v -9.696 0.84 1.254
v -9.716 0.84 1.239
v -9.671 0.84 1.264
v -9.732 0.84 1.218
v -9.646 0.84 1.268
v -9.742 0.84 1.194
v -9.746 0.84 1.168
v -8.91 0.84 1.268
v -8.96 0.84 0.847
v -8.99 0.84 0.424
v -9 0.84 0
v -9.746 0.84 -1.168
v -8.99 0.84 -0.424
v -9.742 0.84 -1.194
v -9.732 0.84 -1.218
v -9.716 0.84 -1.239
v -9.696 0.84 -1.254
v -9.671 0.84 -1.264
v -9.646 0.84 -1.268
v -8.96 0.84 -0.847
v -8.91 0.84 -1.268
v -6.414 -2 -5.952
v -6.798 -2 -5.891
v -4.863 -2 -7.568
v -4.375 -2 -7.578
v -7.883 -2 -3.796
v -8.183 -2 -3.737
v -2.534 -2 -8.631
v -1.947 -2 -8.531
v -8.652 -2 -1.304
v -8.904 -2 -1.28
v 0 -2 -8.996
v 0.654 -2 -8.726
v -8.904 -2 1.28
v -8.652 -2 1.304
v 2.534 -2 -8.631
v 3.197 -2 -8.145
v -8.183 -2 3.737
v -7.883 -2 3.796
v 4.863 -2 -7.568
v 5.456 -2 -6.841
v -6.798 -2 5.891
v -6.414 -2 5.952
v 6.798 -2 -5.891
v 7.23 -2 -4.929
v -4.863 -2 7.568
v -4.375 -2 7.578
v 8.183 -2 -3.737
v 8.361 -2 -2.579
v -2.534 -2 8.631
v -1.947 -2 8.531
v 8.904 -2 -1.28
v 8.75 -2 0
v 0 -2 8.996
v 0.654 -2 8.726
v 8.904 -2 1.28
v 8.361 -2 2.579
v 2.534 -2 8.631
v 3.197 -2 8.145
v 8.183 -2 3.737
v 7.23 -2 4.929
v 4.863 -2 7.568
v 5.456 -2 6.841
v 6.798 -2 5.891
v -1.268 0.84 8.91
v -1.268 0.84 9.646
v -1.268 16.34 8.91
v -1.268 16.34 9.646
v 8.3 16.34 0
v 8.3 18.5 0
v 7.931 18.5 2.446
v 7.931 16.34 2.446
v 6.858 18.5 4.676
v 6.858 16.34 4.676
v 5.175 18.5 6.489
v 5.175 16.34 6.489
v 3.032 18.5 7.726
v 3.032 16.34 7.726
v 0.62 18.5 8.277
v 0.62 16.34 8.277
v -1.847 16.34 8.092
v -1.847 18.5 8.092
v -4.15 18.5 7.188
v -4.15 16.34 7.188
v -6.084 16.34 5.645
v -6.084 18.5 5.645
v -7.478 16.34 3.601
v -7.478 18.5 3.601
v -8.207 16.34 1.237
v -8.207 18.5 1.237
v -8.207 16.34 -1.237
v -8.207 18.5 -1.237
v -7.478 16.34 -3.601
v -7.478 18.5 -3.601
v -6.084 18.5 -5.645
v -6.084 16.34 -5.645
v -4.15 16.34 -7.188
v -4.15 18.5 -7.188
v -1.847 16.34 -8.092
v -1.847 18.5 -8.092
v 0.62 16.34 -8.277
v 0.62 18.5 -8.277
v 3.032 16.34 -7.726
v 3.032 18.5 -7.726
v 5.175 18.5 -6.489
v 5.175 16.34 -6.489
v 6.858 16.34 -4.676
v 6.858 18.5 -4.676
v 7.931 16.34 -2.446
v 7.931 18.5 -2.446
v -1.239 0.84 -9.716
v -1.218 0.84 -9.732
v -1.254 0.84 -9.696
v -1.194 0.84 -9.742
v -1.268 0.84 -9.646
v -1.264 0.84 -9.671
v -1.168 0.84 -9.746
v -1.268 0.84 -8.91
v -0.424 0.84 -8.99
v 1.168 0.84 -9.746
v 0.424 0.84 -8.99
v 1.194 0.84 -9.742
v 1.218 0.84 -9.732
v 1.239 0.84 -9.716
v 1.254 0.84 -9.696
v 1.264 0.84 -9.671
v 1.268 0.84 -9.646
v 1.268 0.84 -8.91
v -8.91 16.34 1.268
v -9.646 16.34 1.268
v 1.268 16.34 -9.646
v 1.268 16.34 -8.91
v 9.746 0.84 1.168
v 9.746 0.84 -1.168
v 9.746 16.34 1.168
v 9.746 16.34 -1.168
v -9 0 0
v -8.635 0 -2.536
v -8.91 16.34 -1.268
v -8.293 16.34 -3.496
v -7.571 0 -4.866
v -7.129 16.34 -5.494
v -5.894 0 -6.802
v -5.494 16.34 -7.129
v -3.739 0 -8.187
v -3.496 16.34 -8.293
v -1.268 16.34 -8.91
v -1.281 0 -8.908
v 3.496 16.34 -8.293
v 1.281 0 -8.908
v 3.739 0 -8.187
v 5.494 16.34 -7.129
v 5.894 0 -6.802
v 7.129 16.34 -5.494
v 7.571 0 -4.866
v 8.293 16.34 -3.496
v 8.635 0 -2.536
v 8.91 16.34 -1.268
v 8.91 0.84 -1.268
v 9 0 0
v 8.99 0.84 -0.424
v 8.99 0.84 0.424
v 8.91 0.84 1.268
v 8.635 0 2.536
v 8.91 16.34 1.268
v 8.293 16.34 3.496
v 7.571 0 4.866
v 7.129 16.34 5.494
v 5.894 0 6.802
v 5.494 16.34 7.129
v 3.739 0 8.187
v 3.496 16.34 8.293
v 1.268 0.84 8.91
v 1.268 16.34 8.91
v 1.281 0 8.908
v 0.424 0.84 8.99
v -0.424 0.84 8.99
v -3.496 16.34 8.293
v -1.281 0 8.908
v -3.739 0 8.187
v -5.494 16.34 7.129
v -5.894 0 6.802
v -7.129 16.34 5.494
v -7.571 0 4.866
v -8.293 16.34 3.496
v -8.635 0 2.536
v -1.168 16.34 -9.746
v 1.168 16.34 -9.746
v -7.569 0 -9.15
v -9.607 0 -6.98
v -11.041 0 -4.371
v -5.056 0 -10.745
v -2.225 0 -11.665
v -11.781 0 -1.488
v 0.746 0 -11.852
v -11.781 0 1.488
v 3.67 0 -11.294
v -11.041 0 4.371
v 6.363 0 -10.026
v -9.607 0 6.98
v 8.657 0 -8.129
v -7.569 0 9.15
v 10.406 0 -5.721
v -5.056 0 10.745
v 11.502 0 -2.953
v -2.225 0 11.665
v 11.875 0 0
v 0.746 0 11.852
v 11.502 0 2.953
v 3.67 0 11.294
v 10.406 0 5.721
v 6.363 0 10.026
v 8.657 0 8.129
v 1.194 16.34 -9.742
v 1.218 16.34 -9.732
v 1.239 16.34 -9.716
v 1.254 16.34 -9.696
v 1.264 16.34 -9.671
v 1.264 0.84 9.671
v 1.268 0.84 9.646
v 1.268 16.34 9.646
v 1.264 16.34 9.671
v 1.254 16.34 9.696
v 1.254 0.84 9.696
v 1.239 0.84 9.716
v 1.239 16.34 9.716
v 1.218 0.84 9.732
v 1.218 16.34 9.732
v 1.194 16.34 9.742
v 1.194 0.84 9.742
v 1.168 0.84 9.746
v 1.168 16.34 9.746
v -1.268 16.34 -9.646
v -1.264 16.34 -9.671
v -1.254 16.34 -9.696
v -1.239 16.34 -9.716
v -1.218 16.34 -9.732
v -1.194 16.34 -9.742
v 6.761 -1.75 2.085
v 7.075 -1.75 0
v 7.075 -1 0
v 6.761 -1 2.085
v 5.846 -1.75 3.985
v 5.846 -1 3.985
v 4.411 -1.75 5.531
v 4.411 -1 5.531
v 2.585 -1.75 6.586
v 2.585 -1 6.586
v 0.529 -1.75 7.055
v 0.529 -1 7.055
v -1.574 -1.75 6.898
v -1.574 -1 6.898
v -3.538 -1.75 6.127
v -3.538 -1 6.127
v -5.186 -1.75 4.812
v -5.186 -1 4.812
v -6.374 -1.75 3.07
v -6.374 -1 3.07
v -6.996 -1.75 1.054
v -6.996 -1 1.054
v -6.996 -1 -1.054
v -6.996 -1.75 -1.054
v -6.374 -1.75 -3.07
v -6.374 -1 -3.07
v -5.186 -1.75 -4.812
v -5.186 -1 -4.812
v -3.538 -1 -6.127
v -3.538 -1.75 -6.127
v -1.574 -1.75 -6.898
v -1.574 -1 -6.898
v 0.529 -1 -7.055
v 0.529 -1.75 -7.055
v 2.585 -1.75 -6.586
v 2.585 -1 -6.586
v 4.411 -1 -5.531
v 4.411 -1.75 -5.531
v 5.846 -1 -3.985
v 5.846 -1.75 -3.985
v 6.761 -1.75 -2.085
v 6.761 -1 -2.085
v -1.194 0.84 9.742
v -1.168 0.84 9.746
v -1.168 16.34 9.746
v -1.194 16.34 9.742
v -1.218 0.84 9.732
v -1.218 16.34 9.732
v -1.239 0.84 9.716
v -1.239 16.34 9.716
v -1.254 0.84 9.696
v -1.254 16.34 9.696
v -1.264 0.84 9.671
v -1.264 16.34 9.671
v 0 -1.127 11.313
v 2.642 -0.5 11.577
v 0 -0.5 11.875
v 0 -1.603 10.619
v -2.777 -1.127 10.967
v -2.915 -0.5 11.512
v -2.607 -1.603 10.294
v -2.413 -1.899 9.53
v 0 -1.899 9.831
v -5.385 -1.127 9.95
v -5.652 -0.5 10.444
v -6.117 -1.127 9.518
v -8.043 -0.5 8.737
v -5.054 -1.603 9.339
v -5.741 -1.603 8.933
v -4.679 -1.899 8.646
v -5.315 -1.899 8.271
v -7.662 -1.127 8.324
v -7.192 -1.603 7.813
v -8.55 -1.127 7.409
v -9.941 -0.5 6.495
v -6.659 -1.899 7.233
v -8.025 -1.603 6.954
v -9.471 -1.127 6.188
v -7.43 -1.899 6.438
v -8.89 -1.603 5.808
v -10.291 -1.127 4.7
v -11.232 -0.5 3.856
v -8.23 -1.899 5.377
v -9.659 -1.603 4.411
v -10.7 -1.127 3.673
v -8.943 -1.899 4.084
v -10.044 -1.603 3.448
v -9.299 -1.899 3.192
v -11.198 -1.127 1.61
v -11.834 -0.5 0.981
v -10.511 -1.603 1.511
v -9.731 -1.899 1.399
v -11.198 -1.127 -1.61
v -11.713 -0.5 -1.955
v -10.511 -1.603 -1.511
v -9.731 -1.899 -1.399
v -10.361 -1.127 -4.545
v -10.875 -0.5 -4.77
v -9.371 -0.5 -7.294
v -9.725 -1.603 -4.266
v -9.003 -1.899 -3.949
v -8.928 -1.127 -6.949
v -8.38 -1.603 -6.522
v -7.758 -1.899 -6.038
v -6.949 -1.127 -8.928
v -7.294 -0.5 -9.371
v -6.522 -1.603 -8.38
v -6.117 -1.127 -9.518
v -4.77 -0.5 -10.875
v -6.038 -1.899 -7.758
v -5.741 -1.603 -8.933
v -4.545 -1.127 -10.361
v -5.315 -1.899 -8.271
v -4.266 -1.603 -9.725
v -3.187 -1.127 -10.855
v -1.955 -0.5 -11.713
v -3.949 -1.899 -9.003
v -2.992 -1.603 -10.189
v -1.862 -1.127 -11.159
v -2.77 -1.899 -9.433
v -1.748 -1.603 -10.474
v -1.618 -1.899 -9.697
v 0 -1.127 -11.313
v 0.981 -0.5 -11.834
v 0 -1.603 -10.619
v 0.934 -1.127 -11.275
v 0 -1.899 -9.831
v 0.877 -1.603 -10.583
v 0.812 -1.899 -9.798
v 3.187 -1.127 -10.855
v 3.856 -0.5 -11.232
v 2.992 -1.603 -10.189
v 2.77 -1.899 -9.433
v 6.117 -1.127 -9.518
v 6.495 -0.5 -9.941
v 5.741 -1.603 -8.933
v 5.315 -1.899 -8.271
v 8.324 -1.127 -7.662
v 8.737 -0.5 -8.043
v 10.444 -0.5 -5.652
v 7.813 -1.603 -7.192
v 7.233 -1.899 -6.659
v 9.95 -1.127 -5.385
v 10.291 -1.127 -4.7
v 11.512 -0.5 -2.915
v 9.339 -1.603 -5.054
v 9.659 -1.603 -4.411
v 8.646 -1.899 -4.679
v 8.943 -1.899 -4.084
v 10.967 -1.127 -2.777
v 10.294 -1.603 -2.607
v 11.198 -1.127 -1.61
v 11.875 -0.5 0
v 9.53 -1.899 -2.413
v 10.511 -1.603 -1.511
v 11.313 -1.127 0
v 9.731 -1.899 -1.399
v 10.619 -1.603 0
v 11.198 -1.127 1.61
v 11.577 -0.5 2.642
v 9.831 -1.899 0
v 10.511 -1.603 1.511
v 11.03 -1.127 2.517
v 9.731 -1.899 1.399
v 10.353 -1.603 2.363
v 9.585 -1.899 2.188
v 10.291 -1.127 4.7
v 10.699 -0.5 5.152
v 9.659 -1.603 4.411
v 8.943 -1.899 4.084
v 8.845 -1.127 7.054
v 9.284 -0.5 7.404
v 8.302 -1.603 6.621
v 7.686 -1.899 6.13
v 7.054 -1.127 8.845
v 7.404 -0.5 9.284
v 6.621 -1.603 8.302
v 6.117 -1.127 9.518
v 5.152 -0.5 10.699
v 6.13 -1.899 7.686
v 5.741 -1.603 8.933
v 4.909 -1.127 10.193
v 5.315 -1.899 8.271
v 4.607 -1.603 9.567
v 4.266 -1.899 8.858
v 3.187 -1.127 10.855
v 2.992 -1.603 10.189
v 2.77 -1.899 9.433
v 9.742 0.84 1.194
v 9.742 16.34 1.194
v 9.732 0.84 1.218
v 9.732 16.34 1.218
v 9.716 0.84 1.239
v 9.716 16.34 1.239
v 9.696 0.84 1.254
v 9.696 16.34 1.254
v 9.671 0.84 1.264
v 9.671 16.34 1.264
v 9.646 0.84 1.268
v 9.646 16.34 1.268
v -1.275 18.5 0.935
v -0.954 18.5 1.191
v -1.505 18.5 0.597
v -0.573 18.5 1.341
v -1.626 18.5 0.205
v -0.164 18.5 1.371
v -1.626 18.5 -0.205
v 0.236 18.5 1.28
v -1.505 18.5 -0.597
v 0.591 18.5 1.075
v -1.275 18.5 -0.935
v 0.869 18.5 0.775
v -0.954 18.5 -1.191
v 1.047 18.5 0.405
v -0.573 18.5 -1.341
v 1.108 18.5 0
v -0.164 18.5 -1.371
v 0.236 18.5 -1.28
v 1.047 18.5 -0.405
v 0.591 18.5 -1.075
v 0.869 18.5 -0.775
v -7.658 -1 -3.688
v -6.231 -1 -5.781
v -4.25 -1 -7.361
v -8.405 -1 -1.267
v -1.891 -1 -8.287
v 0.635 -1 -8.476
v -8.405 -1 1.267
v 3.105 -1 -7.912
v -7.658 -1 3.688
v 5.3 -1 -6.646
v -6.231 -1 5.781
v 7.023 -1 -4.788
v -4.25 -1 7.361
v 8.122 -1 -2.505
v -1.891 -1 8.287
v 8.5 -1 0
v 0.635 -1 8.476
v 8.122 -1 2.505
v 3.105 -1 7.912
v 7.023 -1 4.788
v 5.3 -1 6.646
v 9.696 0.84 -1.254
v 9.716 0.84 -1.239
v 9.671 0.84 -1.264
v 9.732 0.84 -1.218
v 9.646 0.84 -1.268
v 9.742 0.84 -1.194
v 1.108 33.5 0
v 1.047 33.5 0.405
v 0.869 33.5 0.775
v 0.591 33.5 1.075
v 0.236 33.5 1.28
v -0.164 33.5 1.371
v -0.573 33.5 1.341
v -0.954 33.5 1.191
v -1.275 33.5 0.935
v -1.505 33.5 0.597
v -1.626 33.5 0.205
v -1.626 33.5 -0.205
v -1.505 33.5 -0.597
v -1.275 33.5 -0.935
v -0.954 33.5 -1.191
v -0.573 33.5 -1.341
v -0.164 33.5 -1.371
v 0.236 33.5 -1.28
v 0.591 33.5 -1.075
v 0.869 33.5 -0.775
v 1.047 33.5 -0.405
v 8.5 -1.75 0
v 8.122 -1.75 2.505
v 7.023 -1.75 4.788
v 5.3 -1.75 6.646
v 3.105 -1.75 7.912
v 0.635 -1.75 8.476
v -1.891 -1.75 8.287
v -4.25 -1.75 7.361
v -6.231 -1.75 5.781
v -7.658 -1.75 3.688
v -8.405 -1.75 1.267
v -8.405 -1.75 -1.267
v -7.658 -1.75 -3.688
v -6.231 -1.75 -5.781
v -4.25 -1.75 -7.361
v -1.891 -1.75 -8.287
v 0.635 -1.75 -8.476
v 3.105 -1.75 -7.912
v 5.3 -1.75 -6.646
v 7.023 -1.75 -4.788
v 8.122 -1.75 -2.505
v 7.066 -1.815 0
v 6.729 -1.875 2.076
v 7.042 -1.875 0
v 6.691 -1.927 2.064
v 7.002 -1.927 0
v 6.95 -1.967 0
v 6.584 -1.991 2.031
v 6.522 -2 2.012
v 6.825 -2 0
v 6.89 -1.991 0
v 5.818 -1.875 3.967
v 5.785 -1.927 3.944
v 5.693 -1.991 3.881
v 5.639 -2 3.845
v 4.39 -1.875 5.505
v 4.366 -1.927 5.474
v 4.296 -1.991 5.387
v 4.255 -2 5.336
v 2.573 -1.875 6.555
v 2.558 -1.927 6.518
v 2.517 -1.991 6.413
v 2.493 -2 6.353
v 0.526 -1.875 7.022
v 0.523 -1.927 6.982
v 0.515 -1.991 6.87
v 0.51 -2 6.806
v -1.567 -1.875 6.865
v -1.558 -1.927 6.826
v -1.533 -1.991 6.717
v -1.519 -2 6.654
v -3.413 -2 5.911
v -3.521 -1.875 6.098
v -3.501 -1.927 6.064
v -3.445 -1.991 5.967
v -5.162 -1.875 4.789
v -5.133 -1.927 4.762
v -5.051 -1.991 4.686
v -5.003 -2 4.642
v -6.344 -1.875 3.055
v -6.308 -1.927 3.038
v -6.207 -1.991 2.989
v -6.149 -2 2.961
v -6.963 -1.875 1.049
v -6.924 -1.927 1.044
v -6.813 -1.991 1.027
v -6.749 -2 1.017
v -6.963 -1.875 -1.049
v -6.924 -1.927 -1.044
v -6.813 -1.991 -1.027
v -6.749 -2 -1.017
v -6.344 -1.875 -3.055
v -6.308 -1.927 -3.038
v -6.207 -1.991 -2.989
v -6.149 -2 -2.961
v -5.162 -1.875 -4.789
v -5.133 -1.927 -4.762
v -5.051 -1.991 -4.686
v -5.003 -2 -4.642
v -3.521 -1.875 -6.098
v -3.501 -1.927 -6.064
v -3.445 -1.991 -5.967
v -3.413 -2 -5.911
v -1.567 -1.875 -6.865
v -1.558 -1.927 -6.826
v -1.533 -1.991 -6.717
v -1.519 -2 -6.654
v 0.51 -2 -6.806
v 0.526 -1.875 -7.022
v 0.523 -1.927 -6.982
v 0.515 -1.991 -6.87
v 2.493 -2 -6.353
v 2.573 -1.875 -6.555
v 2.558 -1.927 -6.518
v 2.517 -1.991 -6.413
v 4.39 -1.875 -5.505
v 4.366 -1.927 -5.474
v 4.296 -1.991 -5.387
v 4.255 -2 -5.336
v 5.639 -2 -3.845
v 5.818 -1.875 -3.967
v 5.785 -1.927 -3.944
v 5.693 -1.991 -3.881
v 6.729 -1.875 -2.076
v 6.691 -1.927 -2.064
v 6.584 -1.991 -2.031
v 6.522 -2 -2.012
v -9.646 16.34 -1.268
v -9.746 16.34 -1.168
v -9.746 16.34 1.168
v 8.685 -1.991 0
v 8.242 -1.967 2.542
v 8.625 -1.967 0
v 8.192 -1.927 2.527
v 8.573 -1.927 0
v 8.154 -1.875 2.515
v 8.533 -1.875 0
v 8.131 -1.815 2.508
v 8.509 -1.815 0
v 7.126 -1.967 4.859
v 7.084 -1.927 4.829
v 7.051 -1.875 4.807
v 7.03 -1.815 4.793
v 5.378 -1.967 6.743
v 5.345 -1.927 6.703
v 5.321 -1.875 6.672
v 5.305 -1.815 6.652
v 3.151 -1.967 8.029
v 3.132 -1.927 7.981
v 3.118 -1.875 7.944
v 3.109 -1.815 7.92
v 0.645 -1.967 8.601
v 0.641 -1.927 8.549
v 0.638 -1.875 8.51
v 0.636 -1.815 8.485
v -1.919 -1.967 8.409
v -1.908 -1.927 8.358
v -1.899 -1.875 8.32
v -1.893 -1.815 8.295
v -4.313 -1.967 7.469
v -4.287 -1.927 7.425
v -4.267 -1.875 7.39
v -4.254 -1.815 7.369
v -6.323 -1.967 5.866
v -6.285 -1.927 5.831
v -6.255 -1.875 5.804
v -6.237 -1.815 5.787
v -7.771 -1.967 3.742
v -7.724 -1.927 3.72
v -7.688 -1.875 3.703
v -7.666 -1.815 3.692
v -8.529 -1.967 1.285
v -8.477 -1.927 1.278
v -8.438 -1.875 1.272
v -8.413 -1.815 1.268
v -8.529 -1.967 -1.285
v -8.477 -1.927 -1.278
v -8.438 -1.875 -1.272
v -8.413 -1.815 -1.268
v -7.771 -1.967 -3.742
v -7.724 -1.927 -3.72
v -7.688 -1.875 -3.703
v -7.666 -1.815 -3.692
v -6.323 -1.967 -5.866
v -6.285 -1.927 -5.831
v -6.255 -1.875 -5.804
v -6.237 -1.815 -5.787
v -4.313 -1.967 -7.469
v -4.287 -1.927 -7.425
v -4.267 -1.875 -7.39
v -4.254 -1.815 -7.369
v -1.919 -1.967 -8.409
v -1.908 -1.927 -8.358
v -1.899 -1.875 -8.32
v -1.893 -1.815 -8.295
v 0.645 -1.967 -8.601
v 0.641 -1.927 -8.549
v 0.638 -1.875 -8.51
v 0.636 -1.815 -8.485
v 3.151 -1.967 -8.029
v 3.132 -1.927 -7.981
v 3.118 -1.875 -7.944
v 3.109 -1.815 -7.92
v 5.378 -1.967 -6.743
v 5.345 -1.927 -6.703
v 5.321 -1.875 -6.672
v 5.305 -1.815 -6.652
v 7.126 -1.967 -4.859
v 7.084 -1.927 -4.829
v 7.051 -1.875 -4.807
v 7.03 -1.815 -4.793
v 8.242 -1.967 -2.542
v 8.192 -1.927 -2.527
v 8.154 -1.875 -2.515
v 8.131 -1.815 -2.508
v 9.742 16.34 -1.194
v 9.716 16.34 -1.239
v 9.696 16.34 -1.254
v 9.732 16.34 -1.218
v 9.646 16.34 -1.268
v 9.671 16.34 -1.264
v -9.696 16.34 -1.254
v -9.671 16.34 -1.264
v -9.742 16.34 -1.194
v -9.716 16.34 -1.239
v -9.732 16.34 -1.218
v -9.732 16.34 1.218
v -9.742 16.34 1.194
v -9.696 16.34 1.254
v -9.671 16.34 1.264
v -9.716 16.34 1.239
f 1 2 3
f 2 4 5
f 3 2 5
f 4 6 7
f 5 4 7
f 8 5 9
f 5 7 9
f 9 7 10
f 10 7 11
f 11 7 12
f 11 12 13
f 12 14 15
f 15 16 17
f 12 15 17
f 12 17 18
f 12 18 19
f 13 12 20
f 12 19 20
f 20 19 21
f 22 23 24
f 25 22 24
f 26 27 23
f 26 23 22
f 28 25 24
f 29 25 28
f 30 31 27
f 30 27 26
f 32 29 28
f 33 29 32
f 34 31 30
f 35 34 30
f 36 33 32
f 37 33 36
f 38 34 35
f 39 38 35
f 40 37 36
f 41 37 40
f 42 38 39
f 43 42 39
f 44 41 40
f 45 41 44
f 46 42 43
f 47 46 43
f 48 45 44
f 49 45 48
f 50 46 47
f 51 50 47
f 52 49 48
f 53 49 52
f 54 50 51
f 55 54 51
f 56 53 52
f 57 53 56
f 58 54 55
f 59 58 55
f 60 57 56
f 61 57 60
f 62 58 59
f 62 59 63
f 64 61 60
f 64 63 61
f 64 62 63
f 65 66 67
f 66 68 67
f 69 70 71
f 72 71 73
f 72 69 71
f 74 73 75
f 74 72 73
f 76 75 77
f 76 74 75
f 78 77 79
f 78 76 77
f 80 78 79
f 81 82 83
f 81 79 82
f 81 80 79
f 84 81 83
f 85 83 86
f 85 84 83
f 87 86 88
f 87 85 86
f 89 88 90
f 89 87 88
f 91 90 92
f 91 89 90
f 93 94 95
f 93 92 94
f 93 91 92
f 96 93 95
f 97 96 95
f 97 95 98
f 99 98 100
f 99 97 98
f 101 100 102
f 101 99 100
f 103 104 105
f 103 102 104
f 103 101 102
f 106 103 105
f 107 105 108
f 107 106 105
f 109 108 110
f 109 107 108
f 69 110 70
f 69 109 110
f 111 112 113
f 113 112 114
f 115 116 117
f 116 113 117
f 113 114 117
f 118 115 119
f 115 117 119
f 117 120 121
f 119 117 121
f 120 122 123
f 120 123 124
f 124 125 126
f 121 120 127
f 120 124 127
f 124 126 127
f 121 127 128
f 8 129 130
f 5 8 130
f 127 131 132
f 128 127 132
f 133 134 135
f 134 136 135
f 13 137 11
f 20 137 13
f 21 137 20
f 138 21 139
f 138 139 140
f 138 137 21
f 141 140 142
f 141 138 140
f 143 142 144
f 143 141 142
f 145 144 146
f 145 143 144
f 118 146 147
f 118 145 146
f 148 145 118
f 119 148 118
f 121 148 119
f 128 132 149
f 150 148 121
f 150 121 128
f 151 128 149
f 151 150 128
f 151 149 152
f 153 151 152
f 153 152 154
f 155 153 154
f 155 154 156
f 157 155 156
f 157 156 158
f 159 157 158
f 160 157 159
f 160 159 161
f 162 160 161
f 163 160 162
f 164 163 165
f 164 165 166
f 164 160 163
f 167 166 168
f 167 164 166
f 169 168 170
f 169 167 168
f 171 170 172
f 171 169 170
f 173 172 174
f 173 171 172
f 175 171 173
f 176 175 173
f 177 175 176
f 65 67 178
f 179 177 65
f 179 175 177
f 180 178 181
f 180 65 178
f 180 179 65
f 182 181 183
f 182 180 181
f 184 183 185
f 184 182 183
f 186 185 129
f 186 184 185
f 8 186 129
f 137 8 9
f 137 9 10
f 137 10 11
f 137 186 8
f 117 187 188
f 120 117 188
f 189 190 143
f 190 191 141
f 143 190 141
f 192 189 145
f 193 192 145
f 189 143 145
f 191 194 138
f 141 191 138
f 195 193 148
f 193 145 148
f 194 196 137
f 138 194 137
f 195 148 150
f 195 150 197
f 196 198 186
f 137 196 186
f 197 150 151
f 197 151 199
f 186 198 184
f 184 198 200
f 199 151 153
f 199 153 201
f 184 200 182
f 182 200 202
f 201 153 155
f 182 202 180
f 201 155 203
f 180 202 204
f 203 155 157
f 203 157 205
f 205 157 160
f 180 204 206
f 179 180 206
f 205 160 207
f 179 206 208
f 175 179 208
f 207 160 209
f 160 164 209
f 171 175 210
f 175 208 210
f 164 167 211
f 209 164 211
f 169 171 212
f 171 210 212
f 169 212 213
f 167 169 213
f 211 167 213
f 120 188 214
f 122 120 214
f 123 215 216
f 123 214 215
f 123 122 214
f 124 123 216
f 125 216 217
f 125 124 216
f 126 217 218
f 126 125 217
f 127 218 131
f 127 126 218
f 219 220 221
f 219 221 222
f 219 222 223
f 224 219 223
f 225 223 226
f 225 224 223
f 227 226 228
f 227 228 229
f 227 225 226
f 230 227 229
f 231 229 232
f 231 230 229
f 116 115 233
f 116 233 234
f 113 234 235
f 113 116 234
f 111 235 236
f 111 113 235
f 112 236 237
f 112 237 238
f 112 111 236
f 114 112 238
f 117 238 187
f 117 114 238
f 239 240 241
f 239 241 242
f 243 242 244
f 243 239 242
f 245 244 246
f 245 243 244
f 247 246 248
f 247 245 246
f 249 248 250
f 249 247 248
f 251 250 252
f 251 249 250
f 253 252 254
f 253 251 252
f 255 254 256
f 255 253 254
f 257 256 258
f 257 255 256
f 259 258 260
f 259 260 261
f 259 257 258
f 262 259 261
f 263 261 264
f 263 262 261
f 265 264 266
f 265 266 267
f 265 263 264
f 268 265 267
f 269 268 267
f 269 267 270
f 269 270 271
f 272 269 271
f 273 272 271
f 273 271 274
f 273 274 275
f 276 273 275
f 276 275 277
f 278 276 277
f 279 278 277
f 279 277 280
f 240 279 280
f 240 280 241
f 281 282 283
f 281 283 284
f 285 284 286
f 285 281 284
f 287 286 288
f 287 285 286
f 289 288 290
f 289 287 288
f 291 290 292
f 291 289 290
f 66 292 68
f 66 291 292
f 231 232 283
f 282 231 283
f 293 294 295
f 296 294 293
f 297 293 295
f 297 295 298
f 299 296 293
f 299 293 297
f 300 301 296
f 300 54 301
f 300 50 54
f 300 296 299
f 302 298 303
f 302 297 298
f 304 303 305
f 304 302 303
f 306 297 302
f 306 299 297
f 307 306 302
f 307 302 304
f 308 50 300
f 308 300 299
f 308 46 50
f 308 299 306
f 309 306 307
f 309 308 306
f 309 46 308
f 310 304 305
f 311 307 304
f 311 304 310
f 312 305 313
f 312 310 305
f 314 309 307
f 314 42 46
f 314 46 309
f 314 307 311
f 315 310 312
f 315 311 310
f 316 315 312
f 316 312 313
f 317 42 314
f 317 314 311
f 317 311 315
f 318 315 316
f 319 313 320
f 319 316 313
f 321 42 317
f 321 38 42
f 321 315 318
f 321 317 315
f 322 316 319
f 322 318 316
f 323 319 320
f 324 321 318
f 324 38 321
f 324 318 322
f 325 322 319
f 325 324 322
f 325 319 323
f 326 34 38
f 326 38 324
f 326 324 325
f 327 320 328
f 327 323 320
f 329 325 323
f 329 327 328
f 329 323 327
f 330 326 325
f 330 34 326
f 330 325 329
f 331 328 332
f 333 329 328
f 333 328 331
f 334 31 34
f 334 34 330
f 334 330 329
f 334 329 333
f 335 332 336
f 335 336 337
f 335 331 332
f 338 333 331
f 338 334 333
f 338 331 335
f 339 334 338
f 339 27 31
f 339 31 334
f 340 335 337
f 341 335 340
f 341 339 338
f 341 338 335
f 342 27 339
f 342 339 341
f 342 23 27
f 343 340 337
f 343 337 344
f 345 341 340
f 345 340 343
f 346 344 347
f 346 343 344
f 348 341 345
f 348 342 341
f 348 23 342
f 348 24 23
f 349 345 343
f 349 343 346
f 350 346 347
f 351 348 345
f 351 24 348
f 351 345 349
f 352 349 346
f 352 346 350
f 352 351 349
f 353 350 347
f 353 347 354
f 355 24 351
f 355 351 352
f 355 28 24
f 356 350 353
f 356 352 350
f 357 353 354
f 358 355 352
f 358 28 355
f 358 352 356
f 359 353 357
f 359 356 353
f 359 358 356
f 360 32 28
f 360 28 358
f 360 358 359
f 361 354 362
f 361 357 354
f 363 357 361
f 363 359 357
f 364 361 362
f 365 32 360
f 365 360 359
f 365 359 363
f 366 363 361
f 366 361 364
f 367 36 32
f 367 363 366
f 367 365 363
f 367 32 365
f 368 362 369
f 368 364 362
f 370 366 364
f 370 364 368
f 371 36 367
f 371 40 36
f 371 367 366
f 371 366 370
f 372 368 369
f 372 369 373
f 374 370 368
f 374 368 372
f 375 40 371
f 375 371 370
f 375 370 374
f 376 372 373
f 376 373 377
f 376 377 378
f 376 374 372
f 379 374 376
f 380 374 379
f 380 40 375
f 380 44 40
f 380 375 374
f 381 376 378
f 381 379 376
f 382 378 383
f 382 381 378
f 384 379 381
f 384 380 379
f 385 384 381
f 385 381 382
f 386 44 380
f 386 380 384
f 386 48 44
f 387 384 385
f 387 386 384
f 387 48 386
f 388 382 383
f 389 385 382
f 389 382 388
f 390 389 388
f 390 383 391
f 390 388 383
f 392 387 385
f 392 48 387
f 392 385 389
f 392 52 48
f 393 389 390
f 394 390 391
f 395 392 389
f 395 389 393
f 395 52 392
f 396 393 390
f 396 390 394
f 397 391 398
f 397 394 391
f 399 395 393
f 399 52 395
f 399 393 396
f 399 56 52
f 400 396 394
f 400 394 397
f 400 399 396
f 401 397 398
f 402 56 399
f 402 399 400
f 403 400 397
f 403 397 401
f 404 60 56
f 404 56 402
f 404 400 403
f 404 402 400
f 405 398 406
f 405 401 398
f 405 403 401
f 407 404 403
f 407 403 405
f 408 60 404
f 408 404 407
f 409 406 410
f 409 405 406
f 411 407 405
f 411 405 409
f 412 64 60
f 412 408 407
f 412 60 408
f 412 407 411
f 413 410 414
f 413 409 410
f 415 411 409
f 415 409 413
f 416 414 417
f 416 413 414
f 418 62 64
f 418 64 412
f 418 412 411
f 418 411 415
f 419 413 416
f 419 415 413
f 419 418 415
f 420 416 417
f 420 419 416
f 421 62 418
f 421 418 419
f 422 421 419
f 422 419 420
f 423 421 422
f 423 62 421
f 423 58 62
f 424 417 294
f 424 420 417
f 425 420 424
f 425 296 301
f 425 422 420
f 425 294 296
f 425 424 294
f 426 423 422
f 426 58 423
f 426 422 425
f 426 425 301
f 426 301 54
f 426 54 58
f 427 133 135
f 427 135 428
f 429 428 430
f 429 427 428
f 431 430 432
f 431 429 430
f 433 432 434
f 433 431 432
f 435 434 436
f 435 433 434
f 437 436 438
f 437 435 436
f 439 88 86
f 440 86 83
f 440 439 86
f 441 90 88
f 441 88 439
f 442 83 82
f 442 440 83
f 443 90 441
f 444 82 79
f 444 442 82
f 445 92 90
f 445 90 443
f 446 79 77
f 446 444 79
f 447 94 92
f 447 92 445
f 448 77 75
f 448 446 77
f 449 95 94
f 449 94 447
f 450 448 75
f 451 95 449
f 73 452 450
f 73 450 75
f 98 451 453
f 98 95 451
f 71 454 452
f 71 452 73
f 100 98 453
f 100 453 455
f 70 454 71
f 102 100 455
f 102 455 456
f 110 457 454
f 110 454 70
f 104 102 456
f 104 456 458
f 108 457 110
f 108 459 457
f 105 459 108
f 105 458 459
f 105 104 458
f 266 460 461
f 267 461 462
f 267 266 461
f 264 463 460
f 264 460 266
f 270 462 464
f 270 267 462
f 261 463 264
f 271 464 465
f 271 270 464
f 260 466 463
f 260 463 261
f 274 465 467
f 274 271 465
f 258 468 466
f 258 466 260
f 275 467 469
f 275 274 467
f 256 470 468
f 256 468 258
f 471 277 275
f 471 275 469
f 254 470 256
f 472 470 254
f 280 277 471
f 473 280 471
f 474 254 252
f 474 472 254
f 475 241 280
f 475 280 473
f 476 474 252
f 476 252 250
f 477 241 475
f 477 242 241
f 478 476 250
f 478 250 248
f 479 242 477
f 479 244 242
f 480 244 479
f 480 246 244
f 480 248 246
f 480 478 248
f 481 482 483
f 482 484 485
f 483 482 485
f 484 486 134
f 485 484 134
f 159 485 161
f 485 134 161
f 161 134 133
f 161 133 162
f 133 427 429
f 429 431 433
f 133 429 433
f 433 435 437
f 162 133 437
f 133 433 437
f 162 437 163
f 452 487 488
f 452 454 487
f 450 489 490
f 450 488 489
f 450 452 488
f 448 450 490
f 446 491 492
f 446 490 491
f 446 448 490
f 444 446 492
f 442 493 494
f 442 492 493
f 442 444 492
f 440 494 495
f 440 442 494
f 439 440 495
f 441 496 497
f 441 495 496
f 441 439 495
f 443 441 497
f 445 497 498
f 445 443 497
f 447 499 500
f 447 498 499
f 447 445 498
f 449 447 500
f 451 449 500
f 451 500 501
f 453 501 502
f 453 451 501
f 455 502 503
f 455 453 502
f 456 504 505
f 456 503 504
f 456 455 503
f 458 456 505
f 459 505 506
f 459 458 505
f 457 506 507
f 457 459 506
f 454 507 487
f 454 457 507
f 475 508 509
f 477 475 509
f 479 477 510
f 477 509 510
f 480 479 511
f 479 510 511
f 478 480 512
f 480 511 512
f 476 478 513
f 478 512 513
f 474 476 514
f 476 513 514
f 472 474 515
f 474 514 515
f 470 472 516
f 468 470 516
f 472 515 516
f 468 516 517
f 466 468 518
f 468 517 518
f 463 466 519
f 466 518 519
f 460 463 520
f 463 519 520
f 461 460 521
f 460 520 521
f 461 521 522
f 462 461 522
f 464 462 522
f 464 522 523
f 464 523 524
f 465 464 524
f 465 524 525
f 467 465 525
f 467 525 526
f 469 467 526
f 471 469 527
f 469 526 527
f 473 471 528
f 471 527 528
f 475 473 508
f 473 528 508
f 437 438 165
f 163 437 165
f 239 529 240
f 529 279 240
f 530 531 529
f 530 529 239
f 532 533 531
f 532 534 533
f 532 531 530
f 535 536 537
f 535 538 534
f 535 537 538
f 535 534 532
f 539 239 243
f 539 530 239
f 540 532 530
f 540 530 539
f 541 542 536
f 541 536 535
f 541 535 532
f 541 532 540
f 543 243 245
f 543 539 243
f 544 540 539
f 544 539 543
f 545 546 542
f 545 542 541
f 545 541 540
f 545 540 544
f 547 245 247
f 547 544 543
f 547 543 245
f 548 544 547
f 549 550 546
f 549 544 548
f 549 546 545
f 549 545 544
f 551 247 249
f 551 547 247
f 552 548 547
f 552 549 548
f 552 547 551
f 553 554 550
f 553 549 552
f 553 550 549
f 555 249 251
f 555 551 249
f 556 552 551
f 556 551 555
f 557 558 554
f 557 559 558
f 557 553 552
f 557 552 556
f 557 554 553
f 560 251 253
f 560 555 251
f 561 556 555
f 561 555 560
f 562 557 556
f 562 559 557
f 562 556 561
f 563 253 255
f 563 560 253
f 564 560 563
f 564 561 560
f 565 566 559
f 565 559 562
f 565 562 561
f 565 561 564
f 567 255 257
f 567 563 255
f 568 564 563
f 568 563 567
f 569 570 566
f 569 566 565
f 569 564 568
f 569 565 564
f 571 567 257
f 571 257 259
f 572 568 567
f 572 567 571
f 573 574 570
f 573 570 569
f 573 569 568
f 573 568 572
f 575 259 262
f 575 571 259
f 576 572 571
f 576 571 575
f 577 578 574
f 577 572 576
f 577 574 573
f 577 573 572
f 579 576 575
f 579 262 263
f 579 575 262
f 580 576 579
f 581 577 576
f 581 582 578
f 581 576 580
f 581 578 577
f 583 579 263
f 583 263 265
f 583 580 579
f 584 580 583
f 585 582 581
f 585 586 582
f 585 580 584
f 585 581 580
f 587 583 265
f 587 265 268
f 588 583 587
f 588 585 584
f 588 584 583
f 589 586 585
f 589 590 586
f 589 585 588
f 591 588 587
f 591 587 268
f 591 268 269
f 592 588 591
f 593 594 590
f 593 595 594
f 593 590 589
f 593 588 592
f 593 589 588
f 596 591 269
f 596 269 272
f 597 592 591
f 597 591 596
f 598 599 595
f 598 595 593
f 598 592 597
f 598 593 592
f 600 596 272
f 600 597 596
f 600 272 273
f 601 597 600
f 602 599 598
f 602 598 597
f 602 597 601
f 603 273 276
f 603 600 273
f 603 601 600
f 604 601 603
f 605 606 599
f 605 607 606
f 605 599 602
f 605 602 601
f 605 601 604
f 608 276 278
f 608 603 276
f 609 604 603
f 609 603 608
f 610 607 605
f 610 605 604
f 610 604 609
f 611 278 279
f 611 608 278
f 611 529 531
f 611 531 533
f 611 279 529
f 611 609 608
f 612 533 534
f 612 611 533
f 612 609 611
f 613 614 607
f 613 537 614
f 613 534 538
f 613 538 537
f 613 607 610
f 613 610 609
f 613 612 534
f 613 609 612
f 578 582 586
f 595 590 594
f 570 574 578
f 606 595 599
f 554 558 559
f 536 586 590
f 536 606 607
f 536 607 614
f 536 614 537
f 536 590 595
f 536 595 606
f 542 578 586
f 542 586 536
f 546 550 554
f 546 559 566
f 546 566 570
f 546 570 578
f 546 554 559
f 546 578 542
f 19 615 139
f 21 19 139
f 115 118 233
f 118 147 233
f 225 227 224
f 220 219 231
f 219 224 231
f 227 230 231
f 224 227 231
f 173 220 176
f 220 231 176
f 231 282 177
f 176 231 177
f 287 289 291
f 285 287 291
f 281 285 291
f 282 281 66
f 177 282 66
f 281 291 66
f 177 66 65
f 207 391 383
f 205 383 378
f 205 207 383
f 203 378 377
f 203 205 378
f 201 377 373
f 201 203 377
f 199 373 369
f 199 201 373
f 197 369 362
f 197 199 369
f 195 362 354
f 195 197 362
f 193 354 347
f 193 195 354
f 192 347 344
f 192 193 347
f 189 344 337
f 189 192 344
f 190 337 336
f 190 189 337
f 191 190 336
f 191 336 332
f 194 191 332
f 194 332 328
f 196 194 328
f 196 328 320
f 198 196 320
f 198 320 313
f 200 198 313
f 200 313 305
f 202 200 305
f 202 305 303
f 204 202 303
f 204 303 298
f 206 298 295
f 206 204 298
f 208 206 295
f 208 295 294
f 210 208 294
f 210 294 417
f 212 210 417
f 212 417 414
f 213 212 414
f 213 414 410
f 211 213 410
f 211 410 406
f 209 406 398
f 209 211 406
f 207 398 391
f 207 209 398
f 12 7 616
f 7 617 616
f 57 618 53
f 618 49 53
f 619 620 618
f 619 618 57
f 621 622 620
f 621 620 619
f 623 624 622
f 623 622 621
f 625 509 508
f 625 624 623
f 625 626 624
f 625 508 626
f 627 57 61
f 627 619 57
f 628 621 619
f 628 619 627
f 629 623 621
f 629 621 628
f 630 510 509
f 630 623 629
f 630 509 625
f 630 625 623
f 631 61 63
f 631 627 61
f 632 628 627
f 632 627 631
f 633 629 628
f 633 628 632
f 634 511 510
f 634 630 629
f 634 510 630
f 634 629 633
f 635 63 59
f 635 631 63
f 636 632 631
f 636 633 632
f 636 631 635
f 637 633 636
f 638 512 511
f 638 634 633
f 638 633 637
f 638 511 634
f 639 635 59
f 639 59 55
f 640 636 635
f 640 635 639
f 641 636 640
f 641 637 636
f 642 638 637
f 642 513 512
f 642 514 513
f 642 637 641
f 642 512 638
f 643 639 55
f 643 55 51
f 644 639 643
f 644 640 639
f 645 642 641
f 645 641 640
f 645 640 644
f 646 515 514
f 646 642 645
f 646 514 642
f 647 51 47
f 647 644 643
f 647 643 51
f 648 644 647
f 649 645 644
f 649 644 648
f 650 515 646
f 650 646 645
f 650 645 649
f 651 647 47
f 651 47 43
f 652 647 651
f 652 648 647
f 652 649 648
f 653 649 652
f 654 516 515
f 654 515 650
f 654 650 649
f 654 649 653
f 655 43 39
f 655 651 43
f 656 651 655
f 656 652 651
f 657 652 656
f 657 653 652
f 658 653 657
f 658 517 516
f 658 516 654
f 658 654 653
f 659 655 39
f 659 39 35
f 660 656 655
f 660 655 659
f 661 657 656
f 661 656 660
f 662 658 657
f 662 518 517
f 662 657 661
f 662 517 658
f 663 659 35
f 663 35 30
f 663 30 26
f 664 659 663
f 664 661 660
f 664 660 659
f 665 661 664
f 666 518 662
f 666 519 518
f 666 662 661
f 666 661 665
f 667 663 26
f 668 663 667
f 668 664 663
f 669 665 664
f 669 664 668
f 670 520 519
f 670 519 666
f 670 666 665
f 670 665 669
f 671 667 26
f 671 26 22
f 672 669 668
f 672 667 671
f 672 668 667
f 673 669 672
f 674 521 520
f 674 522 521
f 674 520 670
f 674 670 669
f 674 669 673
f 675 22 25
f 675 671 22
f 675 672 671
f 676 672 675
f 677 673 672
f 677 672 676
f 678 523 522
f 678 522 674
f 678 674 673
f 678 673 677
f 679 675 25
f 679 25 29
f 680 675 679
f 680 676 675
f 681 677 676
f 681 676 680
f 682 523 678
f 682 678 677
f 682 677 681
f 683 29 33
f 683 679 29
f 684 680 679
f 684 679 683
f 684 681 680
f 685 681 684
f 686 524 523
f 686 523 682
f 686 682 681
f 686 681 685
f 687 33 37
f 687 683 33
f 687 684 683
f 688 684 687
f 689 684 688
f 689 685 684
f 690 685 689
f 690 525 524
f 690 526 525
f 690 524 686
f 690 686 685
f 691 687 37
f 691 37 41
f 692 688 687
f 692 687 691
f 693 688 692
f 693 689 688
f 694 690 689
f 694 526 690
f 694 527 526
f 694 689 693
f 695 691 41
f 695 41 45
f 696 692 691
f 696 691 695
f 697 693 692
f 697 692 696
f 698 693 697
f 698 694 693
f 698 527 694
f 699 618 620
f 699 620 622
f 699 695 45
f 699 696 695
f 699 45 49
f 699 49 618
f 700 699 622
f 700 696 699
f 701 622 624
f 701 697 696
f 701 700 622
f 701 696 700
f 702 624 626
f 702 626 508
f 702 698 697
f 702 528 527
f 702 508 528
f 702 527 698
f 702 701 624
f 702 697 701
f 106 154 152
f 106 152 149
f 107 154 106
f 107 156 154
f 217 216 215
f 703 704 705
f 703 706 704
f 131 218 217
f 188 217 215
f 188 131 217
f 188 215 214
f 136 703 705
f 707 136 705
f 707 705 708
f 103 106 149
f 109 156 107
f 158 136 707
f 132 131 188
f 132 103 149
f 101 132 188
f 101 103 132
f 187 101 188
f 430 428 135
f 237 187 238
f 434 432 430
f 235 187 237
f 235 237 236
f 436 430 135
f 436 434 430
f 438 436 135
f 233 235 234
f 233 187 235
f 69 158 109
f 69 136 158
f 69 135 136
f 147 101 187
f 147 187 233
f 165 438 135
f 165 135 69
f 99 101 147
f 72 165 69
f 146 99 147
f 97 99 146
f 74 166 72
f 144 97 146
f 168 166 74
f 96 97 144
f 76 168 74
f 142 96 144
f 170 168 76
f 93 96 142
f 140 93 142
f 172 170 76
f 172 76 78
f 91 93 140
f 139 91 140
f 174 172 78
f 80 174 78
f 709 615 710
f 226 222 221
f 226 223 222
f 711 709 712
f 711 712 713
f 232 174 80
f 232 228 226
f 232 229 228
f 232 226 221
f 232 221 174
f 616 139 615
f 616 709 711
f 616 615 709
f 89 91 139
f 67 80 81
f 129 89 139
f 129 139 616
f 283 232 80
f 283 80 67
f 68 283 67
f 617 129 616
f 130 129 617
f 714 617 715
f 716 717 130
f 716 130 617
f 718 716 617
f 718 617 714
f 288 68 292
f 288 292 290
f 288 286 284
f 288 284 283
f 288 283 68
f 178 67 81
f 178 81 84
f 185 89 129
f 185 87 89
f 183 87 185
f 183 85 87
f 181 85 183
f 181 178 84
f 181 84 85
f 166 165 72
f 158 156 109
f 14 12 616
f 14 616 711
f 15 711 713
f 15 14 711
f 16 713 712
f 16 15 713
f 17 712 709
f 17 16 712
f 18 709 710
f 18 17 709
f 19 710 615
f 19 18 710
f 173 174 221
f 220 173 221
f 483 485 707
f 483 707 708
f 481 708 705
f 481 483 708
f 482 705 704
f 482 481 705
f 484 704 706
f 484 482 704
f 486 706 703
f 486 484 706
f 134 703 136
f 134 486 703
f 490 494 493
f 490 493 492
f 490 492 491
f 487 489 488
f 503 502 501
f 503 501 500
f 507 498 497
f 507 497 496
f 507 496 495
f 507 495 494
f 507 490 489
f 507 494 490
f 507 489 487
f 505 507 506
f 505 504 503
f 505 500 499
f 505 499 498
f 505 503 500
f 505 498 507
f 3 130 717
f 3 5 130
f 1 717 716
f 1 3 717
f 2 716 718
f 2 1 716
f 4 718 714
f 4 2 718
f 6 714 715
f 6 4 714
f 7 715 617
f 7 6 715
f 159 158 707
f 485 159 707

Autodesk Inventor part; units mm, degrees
ref_plane "YZ Plane" through (0, 0, 0) normal (1, 0, 0) x (0, 1, 0)
ref_plane "XZ Plane" through (0, 0, 0) normal (0, 1, 0) x (-1, 0, 0)
ref_plane "XY Plane" through (0, 0, 0) normal (0, 0, 1) x (1, 0, 0)
sketch "Skizze1" plane through (0, 0, 0) normal (0, 1, 0) x (-1, 0, 0)
  circle A0 centre (0, 0) radius 9
  dimension "d0" = 18
extrude "Extrusion1" add sketch "Skizze1" along normal blind 16.34
sketch "Skizze2" plane through (0, 16.34, 0) normal (0, 1, 0) x (1, 0, 0)
  circle A0 centre (0, 0) radius 8.3
  dimension "d3" = 16.6
extrude "Extrusion2" add sketch "Skizze2" along normal blind 2.16
sketch "Skizze3" plane through (0, 0, 0) normal (0, -1, 0) x (1, 0, 0)
  circle A0 centre (0, 0) radius 11.875
  dimension "d6" = 23.75
extrude "Extrusion3" add sketch "Skizze3" along normal blind 2
sketch "Skizze4" plane through (0, -2, 0) normal (0, -1, 0) x (1, 0, 0)
  circle A0 centre (0, 0) radius 7.075
  circle A1 centre (0, 0) radius 8.5
  dimension "d9" = 14.15
  dimension "d10" = 17
extrude "Extrusion4" cut sketch "Skizze4" against normal blind 1
fillet "Rundung1" radius 0.25 2 edges at (-7.075, -2, 0) (-8.5, -2, 0)
sketch "Skizze5" plane through (0, 0, 0) normal (1, 0, 0) x (0, 1, 0)
  line L0 (-2, 11.875) -> (-2, -11.875) projected
  line L1 (0, 11.875) -> (-2, 11.875) projected
  arc A0 (-0.5, 11.875) -> (-2, 8.9956) centre (1.5136, 8.9956) ccw
  line L2 (0, 0) -> (-4.6348, 0)
  dimension "d14" = 0.5
revolve "Umdrehung1" cut sketch "Skizze5" angle 360 about axis through (0, 0, 0) along (0, -1, 0)
sketch "Skizze6" plane through (0, 16.34, 0) normal (0, 1, 0) x (1, 0, 0)
  line L0 (-8.2456, -1.2678) -> (-9.7456, -1.2678)
  line L1 (-9.7456, -1.2678) -> (-9.7456, 1.2678)
  line L2 (-9.7456, 1.2678) -> (-8.2456, 1.2678)
  line L3 (-8.2456, 1.2678) -> (-8.2456, -1.2678)
  circle A0 centre (0, 0) radius 8.9956 projected
  line L4 (-8.2456, -1.2678) -> (-9.7456, 1.2678) construction
  line L5 (-9.7456, -1.2678) -> (-8.2456, 1.2678) construction
  point P0 (-8.9956, 0)
  dimension "d16" = 0.75
extrude "Extrusion5" add sketch "Skizze6" against normal blind 15.5 contours L0 A0 L2 L3 | L0 L1 L2 A0 picked at (-8.4923, -0.1413)
fillet "Rundung2" radius 0.1 2 edges at (-9.7456, 8.59, -1.2678) (-9.7456, 8.59, 1.2678)
pattern_circular "Runde Anordnung1" count 4 over 360 about axis through (0, 0, 0) along (0, 1, 0) of "Extrusion5", "Rundung2"
sketch "Skizze7" plane through (0, 18.5, 0) normal (0, 1, 0) x (1, 0, 0)
  circle A0 centre (-0.2666, 0) radius 1.375
  point P0 (0, 0)
  dimension "d23" = 2.75
extrude "Extrusion6" add sketch "Skizze7" along normal blind 15
properties part number "JSN-SR04 US Sensor" material "ABS-Kunststoff"
